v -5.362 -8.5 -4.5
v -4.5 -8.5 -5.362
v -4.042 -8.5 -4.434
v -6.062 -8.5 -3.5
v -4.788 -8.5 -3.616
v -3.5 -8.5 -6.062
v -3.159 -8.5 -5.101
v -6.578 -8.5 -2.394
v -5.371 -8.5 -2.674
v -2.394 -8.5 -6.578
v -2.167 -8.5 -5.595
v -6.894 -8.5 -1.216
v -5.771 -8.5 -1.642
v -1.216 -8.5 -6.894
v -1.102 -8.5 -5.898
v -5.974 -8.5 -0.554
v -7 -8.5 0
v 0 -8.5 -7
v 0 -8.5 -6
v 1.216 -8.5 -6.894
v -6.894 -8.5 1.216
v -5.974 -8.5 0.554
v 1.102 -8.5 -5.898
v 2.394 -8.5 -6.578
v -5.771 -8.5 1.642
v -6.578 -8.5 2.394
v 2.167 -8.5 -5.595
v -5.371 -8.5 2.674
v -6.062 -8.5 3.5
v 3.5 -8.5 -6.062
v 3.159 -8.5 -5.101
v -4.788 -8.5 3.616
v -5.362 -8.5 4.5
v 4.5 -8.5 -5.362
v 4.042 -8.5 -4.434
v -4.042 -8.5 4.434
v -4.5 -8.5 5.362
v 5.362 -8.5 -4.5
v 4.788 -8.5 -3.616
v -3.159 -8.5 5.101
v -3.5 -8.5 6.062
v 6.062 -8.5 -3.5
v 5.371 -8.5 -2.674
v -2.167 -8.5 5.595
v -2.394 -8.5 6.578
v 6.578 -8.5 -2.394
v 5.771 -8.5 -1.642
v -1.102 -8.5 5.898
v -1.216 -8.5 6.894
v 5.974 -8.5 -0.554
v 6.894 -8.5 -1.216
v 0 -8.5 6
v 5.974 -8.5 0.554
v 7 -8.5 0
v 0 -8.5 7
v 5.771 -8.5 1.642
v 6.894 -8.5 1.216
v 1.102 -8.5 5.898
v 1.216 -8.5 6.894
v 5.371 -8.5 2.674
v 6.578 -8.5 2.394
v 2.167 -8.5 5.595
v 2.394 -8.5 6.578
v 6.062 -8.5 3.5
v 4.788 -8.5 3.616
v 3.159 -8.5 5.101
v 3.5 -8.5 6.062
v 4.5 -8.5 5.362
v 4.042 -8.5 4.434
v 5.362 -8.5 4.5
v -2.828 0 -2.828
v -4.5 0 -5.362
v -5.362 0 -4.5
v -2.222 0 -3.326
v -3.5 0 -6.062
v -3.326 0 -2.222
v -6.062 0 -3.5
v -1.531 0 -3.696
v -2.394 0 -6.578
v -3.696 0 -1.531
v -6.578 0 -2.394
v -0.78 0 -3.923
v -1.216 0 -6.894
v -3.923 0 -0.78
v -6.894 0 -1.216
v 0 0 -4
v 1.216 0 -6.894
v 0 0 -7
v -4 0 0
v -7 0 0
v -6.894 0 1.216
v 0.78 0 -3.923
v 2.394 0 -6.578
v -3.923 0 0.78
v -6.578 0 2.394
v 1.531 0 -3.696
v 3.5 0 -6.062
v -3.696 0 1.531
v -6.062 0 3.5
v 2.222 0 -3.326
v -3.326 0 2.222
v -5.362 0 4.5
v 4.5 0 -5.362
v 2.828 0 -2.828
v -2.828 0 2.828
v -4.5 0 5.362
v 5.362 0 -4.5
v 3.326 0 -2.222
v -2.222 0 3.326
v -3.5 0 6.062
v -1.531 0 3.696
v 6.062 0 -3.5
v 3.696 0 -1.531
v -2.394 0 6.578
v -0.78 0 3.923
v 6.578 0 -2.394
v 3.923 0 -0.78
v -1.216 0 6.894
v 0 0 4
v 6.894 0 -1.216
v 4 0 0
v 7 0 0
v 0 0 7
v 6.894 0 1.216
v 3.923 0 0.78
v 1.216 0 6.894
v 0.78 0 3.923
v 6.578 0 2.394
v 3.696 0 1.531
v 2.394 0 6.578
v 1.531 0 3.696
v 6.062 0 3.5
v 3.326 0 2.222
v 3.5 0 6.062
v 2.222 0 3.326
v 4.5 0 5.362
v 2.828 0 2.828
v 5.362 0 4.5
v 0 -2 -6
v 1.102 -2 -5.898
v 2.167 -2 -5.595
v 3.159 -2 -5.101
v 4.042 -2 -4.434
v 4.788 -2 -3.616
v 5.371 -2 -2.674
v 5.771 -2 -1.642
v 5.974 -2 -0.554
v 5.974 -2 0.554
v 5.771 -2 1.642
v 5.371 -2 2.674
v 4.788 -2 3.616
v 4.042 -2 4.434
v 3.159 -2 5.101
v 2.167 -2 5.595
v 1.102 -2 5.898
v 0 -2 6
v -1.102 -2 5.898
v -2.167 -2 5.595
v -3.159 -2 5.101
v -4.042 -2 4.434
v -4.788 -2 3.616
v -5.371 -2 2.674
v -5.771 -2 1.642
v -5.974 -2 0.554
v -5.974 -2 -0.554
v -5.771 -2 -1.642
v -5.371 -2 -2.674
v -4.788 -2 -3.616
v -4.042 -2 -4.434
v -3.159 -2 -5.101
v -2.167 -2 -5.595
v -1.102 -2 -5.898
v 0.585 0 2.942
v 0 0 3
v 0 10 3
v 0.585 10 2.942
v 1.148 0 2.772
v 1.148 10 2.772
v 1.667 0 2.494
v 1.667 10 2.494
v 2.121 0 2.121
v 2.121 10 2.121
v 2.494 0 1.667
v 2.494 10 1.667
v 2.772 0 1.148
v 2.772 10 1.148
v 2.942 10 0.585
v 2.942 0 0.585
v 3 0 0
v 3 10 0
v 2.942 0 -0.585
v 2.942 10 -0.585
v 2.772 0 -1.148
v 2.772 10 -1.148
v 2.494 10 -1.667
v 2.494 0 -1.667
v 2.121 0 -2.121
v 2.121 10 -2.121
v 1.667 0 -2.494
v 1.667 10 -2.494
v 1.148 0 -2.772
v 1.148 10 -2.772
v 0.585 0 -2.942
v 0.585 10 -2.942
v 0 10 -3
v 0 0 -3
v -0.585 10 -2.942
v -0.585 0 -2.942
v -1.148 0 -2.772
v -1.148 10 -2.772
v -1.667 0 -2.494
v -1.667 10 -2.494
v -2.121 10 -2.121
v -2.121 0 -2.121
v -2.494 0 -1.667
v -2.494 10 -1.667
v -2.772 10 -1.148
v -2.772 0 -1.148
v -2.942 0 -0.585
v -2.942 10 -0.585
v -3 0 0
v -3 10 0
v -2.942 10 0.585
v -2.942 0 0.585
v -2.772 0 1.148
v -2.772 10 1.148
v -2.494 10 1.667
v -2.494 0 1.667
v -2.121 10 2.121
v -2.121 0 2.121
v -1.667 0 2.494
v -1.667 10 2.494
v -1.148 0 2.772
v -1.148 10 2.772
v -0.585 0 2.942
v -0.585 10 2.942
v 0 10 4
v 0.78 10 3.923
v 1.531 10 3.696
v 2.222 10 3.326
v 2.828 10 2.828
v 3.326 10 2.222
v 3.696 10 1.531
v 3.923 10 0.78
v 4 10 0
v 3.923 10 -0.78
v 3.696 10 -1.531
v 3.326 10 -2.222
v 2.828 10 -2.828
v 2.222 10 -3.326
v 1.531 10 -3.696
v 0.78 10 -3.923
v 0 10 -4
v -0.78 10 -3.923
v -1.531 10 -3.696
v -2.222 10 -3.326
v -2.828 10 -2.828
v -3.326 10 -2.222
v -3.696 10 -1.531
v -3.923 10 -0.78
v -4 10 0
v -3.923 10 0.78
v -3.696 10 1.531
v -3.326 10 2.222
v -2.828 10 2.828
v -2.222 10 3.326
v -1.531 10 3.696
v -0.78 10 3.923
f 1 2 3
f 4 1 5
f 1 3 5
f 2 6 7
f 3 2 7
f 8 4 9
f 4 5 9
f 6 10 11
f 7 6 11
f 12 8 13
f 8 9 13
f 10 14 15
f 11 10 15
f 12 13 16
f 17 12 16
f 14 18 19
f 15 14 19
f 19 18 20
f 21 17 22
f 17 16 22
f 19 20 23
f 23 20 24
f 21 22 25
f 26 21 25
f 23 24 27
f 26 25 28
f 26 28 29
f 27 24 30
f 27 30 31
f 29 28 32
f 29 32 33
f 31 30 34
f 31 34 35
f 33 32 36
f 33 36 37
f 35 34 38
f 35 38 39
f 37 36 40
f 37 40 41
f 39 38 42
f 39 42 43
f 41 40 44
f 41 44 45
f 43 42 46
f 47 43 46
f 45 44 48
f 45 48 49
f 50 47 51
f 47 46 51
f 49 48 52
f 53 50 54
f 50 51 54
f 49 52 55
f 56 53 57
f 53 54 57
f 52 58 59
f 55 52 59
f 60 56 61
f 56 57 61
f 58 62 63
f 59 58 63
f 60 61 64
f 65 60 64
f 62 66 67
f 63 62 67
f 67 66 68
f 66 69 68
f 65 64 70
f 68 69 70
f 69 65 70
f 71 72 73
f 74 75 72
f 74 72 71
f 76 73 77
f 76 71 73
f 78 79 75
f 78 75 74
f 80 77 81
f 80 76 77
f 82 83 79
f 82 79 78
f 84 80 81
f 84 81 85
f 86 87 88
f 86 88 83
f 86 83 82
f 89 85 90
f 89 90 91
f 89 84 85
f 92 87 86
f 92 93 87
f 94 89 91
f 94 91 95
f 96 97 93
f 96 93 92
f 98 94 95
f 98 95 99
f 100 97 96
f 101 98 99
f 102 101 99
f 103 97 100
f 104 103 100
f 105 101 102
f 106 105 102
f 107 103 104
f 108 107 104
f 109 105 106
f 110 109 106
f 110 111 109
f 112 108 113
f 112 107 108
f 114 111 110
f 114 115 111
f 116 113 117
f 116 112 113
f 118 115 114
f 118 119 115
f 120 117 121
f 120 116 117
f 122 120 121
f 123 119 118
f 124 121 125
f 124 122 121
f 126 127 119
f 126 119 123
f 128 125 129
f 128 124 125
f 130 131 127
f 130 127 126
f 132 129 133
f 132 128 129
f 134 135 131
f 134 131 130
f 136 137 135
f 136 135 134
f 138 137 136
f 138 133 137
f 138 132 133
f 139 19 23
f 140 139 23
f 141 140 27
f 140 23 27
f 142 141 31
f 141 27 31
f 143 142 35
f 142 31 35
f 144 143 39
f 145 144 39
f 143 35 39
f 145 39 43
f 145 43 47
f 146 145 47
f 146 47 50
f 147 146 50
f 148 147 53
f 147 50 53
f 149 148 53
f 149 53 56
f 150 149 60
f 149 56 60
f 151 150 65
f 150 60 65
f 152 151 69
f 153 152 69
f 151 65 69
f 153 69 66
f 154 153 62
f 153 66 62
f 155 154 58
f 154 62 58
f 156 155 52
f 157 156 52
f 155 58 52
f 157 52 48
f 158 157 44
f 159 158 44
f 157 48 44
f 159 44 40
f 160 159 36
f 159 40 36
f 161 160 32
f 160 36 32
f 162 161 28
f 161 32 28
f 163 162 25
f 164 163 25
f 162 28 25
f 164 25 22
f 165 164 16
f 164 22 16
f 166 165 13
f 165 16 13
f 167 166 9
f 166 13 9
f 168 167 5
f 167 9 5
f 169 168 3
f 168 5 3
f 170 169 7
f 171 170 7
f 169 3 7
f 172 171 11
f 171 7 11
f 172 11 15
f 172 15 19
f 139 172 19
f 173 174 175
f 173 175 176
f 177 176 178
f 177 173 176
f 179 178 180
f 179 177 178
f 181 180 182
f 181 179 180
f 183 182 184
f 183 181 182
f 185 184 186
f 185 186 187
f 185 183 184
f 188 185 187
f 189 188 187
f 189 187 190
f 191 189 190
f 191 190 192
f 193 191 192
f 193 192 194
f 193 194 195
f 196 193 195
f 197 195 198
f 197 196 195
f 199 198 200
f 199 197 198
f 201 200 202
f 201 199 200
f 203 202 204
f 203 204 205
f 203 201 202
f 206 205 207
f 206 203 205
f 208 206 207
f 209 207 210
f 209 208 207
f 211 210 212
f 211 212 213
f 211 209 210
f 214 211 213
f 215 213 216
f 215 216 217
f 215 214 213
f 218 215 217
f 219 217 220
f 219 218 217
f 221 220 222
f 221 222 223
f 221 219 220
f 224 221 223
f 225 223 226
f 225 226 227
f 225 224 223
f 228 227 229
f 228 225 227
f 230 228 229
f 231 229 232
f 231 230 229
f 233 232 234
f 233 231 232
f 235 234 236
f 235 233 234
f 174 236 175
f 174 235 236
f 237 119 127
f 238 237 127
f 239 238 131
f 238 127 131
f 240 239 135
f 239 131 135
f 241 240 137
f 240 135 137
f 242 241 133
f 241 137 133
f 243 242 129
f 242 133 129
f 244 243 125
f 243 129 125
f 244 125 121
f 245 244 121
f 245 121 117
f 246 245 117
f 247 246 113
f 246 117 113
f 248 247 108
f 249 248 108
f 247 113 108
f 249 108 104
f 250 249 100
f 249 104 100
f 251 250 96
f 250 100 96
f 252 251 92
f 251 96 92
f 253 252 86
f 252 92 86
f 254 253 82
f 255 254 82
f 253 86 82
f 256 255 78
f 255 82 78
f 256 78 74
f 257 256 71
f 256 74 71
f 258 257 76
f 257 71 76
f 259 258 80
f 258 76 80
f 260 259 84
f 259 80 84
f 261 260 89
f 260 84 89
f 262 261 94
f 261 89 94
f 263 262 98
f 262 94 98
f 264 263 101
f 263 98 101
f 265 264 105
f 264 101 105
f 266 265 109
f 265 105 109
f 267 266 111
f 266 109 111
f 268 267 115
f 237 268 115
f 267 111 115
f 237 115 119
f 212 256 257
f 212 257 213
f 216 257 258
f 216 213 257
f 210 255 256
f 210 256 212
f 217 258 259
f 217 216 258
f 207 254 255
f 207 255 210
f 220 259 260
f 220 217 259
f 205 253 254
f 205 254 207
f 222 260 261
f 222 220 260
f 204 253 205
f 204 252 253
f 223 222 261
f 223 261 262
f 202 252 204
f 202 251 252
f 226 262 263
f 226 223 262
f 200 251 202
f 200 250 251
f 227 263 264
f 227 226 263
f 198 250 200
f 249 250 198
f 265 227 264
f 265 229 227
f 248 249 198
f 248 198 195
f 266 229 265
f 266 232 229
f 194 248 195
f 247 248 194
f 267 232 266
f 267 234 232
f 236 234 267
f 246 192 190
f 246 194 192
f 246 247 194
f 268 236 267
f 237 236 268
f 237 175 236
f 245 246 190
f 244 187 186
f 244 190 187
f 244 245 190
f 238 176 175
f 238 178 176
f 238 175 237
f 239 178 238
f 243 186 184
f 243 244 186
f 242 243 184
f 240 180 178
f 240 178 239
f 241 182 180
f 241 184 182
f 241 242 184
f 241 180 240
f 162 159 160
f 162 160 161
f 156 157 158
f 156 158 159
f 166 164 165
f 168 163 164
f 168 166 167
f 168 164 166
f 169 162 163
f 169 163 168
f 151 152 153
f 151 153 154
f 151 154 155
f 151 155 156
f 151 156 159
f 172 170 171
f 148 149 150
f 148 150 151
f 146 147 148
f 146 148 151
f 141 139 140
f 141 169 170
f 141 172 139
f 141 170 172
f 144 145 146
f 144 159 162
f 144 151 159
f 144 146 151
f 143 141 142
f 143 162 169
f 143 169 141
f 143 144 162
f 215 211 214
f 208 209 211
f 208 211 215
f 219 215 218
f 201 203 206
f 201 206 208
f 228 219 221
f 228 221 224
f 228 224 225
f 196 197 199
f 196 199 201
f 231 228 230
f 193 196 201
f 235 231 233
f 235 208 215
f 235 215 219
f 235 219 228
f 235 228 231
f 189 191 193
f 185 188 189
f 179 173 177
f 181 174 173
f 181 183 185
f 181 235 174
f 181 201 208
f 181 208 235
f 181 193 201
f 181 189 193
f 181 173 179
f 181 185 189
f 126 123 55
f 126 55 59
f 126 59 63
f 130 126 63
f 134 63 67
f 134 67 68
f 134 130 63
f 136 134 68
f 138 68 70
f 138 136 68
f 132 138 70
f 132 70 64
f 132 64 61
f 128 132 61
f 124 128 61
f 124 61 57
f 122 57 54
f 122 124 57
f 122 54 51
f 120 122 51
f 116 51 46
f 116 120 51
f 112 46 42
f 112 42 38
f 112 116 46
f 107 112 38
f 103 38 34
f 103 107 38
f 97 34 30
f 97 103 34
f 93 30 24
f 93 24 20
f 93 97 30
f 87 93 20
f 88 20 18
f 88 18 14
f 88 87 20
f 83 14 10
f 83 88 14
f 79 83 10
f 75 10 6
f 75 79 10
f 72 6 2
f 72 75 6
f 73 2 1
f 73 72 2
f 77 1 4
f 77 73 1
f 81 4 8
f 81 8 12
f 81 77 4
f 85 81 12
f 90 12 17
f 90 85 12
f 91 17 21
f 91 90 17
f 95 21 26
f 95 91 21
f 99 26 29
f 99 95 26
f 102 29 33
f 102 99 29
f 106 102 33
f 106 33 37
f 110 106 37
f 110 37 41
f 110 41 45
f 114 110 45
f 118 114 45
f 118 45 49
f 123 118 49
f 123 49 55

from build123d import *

# Parameters (mm, degrees)
SKETCH1_R           = 4
SKETCH1_R_2         = 3
BOSS_EXTRUDE1_DEPTH = 10
SKETCH2_R           = 7
BOSS_EXTRUDE2_DEPTH = 8.5
SKETCH3_R           = 6
CUT_EXTRUDE1_DEPTH  = 6.5


with BuildPart() as part:
    # Sketch1 → Boss-Extrude1 (new body)
    with BuildSketch(Plane(origin=(0, 0, 0), x_dir=(1, 0, 0), z_dir=(0, 1, 0))):
        with Locations(Location((0, 0, 0), (0, 0, 270))):
            Circle(SKETCH1_R)
        with Locations(Location((0, 0, 0), (0, 0, 270))):
            Circle(SKETCH1_R_2, mode=Mode.SUBTRACT)
    extrude(amount=BOSS_EXTRUDE1_DEPTH)

    # Sketch2 → Boss-Extrude2 (add)
    with BuildSketch(Plane(origin=(0, 0, 0), x_dir=(1, 0, 0), z_dir=(0, 1, 0))):
        with Locations(Location((0, 0, 0), (0, 0, 270))):
            Circle(SKETCH2_R)
    extrude(amount=-BOSS_EXTRUDE2_DEPTH)

    # Sketch3 → Cut-Extrude1 (cut)
    with BuildSketch(Plane.XZ.offset(8.5)):
        with Locations(Location((0, 0, 0), (0, 0, 270))):
            Circle(SKETCH3_R)
    extrude(amount=-CUT_EXTRUDE1_DEPTH, mode=Mode.SUBTRACT)


solid = part.part
